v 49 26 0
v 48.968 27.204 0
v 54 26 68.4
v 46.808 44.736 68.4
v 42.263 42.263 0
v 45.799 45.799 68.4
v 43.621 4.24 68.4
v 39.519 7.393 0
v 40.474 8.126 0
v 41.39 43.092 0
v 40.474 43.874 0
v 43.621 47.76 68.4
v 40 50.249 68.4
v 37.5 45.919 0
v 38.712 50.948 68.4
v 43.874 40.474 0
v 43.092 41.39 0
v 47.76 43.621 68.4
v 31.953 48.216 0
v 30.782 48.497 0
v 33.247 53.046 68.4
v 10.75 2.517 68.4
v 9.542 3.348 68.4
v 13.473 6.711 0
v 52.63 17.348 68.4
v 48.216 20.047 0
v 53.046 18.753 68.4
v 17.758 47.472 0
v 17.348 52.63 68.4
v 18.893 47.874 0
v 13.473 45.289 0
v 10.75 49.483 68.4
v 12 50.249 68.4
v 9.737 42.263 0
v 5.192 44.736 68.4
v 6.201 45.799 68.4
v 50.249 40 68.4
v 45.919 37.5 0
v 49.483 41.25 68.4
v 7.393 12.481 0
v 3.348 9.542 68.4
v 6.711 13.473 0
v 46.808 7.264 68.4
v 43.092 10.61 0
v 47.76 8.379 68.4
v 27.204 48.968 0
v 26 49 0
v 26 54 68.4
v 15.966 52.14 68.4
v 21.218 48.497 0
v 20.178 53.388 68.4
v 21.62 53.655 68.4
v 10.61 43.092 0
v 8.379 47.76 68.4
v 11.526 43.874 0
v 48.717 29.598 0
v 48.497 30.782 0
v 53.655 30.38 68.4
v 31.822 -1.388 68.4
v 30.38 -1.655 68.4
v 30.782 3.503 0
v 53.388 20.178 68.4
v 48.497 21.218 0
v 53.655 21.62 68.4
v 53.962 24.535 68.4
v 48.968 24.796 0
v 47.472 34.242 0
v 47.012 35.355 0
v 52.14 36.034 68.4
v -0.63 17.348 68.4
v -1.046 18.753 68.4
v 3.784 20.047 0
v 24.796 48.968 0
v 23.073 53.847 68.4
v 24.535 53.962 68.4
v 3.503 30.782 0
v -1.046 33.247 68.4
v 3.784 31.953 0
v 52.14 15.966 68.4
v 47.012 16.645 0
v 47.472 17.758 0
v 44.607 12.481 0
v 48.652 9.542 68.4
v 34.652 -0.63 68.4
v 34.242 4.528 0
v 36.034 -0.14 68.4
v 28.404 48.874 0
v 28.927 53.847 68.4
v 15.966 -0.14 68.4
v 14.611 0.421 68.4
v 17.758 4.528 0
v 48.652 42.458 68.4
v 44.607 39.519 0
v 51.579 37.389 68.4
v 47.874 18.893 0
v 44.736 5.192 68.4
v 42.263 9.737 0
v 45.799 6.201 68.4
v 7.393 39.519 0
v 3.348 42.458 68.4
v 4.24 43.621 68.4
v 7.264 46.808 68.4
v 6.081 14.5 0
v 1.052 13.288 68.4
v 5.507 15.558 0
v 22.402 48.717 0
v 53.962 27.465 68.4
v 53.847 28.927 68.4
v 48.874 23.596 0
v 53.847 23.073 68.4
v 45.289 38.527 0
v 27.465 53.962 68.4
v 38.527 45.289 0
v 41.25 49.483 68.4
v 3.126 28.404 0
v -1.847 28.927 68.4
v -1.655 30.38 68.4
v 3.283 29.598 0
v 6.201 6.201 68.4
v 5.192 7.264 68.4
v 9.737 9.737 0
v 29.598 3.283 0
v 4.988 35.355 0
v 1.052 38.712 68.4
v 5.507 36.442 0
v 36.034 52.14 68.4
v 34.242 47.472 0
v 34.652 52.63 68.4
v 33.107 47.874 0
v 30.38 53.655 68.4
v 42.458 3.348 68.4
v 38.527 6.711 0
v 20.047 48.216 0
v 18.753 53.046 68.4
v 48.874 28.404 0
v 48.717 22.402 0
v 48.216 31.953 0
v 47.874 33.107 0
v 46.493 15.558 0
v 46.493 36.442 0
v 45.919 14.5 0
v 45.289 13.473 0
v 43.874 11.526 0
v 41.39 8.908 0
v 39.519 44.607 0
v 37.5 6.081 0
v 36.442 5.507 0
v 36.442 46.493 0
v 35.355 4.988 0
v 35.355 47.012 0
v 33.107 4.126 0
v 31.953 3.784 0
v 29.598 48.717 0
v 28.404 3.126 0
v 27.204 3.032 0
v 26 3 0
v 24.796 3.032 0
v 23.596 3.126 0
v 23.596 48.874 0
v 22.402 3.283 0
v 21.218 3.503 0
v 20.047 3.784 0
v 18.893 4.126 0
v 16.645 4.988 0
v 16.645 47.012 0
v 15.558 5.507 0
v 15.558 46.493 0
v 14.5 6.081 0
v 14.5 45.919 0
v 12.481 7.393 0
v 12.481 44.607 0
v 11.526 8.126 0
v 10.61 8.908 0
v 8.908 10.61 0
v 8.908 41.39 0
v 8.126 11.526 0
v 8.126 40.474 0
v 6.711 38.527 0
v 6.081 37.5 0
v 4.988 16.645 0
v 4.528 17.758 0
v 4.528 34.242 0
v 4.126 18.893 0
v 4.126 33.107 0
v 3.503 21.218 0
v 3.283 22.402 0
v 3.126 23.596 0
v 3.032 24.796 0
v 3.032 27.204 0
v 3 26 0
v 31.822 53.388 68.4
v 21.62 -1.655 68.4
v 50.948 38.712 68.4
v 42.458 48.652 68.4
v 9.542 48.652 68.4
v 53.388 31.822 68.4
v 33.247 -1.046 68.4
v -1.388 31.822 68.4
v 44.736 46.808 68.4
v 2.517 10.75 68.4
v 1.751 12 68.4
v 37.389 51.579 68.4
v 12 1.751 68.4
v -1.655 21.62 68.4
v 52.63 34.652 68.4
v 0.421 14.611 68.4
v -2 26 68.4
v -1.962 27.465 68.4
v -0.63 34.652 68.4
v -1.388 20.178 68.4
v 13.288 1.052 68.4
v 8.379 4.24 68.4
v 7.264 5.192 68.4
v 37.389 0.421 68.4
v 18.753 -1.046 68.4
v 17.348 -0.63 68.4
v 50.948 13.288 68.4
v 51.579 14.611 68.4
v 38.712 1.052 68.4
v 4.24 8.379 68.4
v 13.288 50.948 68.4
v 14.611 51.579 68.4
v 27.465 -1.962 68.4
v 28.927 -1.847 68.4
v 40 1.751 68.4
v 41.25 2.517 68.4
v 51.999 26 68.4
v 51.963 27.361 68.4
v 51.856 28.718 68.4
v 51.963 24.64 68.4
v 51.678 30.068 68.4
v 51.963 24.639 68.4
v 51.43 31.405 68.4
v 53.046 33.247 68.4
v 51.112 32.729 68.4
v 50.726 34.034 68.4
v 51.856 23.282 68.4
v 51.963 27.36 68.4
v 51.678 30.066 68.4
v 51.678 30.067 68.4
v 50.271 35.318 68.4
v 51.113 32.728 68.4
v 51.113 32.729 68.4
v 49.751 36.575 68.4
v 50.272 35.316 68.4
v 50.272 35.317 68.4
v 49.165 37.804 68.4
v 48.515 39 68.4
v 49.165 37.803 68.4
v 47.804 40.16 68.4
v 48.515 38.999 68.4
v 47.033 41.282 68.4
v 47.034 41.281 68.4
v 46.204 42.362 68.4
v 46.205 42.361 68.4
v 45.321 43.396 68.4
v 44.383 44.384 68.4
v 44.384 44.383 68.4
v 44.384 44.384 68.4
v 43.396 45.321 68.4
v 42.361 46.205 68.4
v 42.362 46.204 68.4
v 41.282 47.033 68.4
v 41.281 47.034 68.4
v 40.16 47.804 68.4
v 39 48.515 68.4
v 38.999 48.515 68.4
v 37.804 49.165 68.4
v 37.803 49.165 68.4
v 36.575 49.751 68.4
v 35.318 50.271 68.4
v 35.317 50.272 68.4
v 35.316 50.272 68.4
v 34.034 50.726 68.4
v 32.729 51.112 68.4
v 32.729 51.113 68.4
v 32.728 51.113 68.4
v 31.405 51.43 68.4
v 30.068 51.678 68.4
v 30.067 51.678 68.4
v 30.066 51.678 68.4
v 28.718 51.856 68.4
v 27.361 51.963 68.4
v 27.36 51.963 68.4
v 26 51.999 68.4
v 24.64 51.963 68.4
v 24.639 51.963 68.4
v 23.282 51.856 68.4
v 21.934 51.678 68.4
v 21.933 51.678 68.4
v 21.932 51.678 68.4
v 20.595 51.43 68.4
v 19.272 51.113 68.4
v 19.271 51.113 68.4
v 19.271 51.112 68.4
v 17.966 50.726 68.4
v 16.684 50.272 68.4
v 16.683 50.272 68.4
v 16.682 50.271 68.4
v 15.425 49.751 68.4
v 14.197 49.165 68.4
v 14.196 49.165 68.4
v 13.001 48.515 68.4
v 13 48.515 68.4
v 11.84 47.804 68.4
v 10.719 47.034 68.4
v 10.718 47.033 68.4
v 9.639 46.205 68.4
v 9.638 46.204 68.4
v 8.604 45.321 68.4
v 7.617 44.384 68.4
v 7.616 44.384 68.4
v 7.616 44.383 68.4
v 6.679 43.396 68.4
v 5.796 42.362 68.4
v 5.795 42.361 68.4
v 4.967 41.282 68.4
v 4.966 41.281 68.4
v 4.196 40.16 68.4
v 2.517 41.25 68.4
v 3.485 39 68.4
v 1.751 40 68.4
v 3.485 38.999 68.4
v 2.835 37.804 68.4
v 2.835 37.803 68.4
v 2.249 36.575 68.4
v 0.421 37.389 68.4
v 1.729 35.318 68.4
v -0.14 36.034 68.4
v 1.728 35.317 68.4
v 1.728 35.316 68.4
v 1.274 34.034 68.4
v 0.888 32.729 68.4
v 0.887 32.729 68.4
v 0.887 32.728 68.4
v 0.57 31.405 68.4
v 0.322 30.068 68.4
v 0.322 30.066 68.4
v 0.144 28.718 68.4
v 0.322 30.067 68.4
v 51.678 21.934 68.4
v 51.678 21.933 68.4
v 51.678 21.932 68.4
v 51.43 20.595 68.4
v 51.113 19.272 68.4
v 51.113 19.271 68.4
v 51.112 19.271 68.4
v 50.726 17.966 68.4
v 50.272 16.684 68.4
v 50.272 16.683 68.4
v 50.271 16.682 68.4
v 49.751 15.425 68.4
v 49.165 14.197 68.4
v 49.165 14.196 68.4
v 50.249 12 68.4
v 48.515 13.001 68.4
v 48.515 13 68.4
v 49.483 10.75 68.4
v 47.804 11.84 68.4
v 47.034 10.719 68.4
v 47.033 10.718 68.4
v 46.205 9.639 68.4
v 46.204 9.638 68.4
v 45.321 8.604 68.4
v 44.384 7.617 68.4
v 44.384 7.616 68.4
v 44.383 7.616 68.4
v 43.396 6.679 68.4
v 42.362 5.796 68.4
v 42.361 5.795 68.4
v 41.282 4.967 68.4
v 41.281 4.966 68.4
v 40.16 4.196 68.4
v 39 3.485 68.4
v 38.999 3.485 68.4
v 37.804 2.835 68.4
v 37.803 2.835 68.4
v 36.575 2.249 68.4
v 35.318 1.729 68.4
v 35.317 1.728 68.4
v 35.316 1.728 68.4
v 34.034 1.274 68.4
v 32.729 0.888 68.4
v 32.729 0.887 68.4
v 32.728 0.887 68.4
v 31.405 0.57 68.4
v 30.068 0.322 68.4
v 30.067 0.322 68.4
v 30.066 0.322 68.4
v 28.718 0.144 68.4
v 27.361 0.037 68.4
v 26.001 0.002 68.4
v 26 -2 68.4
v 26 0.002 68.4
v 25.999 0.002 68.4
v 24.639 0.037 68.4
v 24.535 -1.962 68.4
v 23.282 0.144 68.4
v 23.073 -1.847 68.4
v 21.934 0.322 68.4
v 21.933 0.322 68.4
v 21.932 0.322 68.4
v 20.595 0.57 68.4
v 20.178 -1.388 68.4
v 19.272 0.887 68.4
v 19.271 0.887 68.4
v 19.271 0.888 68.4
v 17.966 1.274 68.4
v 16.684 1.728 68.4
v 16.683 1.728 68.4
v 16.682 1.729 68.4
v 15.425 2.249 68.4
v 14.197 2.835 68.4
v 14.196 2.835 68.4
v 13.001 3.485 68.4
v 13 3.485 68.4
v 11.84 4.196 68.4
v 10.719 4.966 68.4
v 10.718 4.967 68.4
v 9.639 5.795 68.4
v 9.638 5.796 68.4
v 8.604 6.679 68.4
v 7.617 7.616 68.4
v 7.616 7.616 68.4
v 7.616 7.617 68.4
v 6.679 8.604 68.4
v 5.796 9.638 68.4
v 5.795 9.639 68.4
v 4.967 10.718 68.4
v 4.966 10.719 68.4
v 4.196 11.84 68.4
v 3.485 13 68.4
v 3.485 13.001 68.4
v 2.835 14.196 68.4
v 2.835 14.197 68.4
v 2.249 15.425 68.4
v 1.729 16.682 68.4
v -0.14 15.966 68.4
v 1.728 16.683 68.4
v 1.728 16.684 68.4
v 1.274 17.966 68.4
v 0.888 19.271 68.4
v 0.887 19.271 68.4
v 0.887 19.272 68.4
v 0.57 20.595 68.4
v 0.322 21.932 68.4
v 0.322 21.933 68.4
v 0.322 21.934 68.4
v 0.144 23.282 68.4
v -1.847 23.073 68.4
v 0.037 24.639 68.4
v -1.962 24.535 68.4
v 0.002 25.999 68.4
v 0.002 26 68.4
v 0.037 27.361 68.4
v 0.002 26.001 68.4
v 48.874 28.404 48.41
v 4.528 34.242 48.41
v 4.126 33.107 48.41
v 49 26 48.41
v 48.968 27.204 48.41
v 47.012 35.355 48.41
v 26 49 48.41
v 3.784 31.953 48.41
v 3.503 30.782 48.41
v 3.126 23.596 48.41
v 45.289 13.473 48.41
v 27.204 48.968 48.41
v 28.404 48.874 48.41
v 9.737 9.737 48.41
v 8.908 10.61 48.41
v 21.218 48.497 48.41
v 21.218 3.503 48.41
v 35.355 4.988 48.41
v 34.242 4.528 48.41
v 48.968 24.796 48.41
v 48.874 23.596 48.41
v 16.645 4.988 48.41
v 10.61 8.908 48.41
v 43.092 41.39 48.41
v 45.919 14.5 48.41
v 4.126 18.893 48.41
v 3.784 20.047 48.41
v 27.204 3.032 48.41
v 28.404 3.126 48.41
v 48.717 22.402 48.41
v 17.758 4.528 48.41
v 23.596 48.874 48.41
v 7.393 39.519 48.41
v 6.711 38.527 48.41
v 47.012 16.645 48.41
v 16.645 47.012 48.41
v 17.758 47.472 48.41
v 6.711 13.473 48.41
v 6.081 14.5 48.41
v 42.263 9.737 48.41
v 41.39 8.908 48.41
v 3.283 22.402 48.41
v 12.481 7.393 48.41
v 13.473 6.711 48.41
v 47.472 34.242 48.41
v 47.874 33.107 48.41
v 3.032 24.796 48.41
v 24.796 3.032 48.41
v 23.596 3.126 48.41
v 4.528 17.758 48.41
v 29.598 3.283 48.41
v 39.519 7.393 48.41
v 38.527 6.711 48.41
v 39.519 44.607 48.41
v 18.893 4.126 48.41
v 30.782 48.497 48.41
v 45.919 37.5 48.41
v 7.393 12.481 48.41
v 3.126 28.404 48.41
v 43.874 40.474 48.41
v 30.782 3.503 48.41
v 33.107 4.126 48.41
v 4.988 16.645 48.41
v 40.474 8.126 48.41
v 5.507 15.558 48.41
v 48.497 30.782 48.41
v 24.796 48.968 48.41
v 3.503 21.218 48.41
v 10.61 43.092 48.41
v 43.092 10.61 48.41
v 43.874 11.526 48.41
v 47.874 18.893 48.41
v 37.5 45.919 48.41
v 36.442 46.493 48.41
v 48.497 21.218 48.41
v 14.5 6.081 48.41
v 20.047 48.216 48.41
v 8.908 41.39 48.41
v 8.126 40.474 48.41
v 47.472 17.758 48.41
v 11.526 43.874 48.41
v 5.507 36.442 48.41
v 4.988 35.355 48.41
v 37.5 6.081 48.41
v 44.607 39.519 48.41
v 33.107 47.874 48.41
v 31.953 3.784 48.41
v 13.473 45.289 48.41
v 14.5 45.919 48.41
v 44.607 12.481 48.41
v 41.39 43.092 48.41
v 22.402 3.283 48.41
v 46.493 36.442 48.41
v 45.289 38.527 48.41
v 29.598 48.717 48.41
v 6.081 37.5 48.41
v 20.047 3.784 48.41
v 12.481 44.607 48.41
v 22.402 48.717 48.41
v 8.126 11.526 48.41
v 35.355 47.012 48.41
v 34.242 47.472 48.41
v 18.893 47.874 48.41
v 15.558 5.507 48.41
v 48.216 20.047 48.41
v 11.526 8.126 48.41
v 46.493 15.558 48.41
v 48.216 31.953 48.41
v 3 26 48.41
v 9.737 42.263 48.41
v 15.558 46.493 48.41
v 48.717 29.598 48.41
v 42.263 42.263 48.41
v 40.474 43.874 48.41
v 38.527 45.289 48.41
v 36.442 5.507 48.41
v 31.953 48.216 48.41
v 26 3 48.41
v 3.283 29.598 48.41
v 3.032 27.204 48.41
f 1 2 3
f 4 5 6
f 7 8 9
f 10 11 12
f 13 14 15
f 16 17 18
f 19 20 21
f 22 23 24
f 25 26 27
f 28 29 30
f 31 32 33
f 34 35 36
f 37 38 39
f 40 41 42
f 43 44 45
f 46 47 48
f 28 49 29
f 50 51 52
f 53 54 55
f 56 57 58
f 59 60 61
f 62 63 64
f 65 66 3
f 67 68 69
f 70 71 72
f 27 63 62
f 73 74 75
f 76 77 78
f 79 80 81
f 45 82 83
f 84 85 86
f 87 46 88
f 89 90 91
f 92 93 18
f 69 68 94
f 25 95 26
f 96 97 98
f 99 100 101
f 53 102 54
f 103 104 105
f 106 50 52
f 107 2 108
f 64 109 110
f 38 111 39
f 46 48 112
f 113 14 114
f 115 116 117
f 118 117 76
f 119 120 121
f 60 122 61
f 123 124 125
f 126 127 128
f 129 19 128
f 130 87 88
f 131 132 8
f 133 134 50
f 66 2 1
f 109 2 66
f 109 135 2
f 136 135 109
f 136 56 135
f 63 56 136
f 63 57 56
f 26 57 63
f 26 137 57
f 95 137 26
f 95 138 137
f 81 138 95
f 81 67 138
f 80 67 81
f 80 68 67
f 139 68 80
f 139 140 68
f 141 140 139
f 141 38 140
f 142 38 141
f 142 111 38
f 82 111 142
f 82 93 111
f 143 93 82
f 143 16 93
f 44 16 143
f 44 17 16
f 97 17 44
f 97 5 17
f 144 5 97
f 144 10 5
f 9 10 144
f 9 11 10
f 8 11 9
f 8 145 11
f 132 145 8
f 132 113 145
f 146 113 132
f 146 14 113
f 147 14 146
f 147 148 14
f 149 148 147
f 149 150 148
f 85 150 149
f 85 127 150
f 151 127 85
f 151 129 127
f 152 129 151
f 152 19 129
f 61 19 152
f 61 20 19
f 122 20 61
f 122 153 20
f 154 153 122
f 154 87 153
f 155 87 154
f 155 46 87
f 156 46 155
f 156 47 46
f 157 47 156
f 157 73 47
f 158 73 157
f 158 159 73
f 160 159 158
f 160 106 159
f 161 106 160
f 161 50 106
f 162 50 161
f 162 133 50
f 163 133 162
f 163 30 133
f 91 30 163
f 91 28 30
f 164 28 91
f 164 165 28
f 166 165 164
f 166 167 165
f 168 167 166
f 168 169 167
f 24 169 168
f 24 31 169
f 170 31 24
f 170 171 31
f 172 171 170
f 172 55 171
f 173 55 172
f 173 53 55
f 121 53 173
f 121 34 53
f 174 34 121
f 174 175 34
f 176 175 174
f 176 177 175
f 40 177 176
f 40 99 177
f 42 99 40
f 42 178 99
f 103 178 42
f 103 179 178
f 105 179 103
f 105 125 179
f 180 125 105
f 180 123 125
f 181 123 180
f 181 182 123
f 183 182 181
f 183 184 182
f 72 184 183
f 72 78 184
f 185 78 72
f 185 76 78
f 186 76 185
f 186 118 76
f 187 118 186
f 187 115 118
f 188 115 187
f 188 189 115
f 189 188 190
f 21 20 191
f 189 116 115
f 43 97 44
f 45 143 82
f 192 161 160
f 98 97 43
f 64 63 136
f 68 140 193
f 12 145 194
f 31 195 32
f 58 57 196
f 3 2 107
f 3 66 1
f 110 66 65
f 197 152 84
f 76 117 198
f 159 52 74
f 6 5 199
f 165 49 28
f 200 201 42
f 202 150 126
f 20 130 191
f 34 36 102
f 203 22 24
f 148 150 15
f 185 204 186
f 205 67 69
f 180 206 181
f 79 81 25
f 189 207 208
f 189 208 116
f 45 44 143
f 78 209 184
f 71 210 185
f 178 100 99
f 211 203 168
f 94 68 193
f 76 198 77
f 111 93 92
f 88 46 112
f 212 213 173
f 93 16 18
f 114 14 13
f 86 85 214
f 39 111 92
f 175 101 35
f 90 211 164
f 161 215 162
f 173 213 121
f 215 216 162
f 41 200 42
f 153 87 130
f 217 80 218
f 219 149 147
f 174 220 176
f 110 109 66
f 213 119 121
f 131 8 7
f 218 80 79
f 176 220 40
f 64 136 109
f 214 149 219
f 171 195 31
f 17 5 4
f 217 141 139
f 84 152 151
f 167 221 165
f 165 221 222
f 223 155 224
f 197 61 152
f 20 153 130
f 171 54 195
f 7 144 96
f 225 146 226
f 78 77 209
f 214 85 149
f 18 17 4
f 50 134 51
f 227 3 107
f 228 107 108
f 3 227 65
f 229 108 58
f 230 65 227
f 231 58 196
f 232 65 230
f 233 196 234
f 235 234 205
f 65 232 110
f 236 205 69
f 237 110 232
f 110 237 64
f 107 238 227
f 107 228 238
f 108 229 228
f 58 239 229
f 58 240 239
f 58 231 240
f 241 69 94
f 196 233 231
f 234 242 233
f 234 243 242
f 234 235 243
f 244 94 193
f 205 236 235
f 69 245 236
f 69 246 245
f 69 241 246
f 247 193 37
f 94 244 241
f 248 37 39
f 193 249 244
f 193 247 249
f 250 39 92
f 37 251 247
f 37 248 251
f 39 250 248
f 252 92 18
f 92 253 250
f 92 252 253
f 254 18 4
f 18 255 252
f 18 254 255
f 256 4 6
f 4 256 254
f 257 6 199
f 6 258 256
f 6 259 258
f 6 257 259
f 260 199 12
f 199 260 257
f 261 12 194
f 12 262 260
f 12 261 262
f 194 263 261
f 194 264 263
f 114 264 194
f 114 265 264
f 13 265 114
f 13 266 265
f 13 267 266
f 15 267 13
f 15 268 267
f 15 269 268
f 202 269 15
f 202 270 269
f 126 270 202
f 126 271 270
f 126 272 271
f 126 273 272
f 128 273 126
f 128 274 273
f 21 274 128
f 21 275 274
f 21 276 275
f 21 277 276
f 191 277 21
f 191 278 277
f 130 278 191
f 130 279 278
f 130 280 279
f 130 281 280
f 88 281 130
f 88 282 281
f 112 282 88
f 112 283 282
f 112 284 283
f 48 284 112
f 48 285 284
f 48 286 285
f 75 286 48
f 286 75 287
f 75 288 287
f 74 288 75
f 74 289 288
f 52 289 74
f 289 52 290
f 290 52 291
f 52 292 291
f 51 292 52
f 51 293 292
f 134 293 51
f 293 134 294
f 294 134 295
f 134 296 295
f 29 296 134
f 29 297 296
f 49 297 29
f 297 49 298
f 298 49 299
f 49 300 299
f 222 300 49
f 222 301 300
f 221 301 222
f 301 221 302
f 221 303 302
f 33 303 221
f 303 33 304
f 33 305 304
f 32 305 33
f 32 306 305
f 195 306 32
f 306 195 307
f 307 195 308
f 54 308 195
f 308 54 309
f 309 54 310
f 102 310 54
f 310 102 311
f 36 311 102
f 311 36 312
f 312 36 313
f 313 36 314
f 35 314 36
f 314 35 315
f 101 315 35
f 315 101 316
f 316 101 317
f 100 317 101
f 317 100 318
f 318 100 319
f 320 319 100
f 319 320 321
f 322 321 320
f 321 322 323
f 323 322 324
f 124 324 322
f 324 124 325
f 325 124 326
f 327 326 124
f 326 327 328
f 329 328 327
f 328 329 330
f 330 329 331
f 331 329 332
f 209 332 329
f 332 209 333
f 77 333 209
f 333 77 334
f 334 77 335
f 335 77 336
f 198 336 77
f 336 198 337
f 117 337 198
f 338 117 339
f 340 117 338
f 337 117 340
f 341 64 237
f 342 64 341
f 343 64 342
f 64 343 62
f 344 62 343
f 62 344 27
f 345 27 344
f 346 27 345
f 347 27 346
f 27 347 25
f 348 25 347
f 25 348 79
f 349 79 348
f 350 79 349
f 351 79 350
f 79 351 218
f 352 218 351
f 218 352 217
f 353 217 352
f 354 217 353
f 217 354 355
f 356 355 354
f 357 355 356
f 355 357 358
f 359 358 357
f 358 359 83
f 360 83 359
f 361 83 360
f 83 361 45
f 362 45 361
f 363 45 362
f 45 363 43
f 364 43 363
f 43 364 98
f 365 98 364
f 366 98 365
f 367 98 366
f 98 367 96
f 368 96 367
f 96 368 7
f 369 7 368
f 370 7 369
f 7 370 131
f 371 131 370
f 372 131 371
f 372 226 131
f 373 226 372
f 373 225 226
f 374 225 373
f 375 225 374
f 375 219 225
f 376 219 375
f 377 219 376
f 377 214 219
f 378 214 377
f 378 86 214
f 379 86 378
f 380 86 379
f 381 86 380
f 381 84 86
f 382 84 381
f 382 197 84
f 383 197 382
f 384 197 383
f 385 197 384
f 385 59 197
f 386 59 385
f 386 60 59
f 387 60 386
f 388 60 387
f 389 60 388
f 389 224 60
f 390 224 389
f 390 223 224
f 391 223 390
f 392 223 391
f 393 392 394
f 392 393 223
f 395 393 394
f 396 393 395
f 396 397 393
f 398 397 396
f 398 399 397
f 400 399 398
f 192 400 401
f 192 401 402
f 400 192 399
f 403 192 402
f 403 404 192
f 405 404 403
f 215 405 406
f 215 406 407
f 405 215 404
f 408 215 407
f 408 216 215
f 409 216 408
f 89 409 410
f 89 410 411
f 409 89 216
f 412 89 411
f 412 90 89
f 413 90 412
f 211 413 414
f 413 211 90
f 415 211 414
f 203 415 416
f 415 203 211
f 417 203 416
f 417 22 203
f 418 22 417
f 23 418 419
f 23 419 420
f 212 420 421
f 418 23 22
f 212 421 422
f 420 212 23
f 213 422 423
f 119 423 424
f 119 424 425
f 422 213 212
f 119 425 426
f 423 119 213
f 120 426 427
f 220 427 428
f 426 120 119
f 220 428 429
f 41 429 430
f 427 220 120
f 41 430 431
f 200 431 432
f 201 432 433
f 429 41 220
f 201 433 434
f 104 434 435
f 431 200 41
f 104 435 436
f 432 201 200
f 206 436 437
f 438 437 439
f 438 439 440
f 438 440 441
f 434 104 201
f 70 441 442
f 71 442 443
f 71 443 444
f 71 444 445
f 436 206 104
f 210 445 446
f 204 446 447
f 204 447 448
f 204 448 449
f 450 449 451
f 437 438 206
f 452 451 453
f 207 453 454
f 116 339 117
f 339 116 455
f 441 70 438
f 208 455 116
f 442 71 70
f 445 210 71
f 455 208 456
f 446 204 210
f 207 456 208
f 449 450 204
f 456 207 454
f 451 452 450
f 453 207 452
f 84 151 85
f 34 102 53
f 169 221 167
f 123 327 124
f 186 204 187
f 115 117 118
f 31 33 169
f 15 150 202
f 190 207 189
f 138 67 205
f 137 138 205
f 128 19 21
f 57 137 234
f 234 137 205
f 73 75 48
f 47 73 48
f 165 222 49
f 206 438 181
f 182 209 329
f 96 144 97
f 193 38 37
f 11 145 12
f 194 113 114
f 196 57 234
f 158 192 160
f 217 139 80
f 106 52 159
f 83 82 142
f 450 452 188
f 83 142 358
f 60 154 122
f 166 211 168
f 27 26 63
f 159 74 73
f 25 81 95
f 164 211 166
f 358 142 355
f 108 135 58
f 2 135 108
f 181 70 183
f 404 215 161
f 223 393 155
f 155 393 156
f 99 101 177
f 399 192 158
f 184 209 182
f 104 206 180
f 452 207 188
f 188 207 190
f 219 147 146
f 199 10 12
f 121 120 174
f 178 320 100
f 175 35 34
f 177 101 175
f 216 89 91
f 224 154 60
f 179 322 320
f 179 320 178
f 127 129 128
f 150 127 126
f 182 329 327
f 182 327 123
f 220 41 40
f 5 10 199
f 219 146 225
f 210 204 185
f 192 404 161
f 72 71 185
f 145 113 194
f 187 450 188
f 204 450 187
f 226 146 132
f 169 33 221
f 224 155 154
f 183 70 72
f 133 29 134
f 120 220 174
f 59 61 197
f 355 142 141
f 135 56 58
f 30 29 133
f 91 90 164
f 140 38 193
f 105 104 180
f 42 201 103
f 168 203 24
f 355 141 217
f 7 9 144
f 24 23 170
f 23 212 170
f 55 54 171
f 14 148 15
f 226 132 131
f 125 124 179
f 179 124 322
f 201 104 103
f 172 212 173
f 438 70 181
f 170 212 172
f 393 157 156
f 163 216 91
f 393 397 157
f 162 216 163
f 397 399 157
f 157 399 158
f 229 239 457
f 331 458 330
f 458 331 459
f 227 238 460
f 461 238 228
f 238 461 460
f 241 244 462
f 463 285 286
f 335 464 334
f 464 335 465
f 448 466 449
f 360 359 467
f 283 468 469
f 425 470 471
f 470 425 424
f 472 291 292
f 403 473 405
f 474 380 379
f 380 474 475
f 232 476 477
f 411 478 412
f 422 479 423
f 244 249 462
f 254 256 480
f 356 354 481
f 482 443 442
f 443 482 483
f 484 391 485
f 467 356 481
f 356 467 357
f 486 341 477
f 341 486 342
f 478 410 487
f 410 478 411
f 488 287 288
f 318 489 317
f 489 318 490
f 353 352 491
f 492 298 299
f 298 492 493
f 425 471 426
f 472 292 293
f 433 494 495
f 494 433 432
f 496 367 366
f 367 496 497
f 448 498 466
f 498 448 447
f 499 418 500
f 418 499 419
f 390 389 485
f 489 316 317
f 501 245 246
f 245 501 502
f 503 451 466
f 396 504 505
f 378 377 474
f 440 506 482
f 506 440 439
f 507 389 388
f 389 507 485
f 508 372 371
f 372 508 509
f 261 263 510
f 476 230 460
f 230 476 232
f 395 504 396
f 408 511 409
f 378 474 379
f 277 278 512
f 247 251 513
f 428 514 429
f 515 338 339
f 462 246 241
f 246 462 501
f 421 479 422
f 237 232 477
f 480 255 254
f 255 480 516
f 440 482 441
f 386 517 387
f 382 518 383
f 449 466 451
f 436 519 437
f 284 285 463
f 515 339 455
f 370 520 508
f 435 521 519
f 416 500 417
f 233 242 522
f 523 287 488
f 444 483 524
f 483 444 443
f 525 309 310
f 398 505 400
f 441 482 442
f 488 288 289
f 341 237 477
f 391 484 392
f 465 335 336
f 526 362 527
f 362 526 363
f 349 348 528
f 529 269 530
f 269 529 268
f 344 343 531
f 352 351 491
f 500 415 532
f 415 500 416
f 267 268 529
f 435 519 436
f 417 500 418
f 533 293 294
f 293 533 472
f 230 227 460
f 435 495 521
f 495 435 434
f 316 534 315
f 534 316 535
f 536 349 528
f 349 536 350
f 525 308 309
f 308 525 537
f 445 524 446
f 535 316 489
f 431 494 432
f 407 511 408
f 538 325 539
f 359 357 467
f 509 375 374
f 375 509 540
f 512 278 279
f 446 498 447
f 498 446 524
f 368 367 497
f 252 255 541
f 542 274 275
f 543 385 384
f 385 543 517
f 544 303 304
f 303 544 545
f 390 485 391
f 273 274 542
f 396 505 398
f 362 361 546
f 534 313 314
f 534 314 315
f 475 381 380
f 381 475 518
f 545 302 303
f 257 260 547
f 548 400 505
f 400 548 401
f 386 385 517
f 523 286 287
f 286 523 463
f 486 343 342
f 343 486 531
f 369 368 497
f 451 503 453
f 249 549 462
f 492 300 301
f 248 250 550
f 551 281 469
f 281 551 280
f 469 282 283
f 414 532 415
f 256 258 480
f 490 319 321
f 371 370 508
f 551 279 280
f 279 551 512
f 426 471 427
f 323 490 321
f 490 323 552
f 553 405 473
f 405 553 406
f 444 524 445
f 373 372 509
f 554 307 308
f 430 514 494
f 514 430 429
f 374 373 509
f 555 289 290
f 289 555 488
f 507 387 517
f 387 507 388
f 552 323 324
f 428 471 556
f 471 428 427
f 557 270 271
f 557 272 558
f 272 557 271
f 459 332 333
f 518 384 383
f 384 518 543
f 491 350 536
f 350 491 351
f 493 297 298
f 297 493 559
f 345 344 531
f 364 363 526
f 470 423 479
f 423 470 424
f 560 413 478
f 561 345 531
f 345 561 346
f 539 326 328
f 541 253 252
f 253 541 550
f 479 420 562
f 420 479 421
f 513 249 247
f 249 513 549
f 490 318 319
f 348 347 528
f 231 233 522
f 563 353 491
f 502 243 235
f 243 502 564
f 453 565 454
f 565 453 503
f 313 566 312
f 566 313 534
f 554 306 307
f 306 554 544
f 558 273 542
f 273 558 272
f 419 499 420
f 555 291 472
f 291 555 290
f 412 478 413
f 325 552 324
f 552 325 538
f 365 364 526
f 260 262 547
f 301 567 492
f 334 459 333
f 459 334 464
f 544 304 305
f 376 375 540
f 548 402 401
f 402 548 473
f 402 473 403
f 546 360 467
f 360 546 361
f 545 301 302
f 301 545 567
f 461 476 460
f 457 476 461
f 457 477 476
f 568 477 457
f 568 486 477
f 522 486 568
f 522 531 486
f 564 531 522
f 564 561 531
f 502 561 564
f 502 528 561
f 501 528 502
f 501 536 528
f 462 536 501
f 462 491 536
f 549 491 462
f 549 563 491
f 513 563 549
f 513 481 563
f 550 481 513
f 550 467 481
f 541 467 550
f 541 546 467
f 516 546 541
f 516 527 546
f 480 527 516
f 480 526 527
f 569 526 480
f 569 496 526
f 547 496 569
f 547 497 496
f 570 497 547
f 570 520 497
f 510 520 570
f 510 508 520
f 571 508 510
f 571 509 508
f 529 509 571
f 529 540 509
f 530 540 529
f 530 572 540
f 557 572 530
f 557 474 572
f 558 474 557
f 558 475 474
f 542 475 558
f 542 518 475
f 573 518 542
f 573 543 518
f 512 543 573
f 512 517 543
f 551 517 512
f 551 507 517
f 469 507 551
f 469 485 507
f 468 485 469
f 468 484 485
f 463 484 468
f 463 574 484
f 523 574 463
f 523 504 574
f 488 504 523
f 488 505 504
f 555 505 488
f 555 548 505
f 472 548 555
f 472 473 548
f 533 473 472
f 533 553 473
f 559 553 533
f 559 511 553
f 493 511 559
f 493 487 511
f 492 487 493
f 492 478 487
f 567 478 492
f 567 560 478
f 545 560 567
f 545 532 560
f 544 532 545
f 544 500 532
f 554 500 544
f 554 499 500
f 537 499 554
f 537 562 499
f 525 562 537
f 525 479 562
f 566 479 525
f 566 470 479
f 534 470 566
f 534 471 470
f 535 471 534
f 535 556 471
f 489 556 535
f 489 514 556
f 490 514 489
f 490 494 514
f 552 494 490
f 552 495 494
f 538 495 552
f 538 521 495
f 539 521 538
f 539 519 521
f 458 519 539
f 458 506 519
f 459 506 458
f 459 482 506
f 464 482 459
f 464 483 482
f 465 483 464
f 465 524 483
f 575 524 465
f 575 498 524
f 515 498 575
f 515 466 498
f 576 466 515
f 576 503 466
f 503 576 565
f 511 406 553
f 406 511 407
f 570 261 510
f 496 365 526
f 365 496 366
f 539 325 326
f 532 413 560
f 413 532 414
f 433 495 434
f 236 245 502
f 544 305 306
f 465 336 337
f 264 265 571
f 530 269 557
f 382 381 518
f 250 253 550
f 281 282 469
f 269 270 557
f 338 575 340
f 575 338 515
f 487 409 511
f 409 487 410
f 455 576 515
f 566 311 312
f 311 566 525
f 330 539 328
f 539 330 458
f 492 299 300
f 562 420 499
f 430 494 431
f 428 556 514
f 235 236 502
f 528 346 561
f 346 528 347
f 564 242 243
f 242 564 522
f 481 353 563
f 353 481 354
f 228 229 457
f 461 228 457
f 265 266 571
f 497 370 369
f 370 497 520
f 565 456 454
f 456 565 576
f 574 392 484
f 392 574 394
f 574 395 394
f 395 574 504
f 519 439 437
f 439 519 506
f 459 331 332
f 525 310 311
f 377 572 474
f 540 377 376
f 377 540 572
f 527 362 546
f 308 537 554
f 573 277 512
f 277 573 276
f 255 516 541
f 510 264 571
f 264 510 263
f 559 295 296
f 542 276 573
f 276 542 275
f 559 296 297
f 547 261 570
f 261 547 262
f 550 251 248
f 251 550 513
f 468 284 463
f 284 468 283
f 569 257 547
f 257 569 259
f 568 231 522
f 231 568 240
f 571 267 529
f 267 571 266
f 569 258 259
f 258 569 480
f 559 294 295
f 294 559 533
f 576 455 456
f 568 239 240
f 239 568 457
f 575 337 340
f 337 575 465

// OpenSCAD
//wheel_rise_height = 45;
slot_width = 23;
slot_depth = 58;
wheel_diameter = 45;
total_wheel_riser_height = 95;
total_wheel_height = 42;
$fn = 120;
feet_height = 66;


module wheel_riser() {
    difference() {
        scale([.7,1,1])
            cylinder(h = total_wheel_riser_height, d2 = max(slot_width, slot_depth) + 20, d1 = max(slot_width, slot_depth));
            
        translate([-slot_width/2,-slot_depth/2,total_wheel_riser_height - total_wheel_height+wheel_diameter/2])
            cube([slot_width, slot_depth, total_wheel_riser_height]);

        translate([-slot_width/2,0,total_wheel_riser_height-total_wheel_height+wheel_diameter/2]) 
            rotate([90, 0, 90]) cylinder(h = slot_width, d = wheel_diameter);
            
    }
}

foot_lift = total_wheel_riser_height - feet_height + 19.4;
foot_hole_top_diameter = 52;
foot_hole_bottom_diameter = 46;
foot_hole_height = 20;
top_wall_thickness = 4;

module foot_riser() {

    difference() {
        translate([foot_hole_top_diameter/2, foot_hole_top_diameter/2, 0])
            cylinder(h = foot_lift+foot_hole_height, d2 = foot_hole_top_diameter+top_wall_thickness, d1 = foot_hole_bottom_diameter);

        translate([foot_hole_top_diameter/2, foot_hole_top_diameter/2, foot_lift+.01])
            cylinder(h = foot_hole_height, d2 = foot_hole_top_diameter, d1 = foot_hole_bottom_diameter);
    }
}

foot_riser();
